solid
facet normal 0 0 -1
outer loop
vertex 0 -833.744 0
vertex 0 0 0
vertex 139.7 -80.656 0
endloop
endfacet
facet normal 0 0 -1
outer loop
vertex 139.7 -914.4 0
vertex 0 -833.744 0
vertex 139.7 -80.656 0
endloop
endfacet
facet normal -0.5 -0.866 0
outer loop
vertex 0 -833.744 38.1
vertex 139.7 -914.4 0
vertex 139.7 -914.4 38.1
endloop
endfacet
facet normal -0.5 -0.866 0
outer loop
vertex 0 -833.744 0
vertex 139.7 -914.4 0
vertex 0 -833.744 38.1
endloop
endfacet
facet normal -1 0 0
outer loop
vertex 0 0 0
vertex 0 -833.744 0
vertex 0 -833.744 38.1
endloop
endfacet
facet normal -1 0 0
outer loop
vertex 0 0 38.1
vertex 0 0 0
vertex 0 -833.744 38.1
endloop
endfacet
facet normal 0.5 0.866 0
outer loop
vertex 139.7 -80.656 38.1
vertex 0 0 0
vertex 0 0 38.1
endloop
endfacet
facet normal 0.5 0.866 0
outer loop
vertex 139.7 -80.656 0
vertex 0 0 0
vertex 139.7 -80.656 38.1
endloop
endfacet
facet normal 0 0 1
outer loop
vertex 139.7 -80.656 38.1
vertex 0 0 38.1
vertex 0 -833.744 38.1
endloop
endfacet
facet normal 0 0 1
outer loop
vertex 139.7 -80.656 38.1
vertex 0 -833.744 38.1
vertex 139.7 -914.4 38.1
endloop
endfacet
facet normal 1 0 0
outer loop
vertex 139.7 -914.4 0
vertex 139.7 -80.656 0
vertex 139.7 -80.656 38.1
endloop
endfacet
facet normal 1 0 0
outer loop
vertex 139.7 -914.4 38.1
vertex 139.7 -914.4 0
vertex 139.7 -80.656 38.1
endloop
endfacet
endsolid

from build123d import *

# Parameters (mm, degrees)
F0_W     = 139.7
F0_H     = 38.1
F1_DEPTH = 914.4
F3_DEPTH = 50.8
F5_DEPTH = 50.8


with BuildPart() as f1:
    # F0 (on Front) → F1 (new body)
    with BuildSketch(Plane.XZ):
        with Locations((69.85, 19.05)):
            Rectangle(F0_W, F0_H)
    extrude(amount=F1_DEPTH)

    # F2 (on Top) → F3 (cut)
    with BuildSketch(Plane.XY):
        Polygon((152.4, 0), (0, 0), (152.4, -87.988181), align=None)
    extrude(amount=F3_DEPTH, mode=Mode.SUBTRACT)

    # F4 (on Top) → F5 (cut)
    with BuildSketch(Plane.XY):
        Polygon((139.7, -914.4), (-12.7, -826.411819), (-12.7, -914.4), align=None)
    extrude(amount=F5_DEPTH, mode=Mode.SUBTRACT)


solid = f1.part
